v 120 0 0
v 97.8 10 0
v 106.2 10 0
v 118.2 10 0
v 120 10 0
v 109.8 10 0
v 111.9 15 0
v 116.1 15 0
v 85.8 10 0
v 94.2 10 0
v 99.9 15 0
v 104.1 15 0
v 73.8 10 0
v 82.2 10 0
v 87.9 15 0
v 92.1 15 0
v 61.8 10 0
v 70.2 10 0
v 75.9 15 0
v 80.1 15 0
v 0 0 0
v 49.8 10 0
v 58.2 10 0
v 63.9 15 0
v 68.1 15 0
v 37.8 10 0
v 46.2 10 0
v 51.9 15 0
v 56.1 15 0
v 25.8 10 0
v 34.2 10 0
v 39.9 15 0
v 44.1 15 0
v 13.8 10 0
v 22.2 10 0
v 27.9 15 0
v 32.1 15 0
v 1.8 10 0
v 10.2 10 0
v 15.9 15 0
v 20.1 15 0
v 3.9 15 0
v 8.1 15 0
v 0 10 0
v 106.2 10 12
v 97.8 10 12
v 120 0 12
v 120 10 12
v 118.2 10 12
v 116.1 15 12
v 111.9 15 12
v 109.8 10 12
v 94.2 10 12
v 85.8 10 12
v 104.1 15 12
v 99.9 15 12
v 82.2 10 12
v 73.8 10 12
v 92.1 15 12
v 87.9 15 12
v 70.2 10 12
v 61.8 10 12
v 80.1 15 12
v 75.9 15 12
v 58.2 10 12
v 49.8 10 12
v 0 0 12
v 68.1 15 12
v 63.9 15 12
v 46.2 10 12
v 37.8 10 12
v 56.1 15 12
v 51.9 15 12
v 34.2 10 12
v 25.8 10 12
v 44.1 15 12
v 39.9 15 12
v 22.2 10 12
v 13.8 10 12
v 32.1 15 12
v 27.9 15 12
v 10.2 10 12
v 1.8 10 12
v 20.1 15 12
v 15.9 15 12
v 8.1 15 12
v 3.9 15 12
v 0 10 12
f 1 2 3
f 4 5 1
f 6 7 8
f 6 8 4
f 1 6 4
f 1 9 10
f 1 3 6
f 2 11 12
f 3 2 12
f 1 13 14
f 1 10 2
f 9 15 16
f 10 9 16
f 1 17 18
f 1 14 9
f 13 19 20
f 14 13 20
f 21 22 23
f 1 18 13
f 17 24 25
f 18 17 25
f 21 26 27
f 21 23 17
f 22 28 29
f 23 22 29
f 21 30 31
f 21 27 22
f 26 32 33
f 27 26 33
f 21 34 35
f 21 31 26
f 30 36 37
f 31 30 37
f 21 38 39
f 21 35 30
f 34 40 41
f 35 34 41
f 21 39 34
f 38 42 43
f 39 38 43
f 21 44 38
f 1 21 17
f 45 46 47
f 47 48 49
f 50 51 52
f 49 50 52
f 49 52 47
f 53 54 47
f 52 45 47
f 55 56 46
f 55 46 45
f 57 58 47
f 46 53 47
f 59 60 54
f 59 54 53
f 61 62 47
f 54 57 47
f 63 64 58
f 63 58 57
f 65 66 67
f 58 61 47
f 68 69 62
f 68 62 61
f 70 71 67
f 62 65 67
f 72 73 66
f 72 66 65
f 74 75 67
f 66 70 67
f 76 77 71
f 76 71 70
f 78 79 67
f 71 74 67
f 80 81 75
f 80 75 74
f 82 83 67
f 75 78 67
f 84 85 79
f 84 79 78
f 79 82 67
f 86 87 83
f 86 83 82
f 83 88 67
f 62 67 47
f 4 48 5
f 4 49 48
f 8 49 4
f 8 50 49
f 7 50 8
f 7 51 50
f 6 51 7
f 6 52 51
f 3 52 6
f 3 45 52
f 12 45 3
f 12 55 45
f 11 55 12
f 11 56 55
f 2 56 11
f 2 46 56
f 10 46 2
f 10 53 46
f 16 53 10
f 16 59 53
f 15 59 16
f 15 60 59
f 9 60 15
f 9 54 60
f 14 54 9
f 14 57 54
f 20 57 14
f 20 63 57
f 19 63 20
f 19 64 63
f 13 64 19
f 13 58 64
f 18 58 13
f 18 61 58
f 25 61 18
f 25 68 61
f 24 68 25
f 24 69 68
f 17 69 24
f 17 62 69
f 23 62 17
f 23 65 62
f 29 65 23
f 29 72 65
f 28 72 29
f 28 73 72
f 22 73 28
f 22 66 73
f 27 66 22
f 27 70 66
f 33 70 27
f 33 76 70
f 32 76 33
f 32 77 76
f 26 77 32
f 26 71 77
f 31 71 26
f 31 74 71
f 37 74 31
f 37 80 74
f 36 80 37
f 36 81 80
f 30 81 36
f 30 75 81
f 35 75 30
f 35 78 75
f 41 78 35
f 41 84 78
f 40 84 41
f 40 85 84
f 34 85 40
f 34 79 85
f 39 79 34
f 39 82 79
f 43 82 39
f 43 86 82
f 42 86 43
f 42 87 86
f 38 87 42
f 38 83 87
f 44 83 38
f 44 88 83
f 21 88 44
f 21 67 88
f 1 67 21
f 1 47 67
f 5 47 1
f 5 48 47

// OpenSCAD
$fn = 32;

// ----------------------------------------------------------------------
// Gear rack: 10 teeth, pitch 12 mm
// ----------------------------------------------------------------------

// --- parameters (mm) ---
teeth = 10;               // number of teeth
pitch = 12;               // tooth pitch, X
root_w = 8.4;             // tooth width at the root
tip_w = 4.2;              // tooth width at the tip
base_h = 10;              // rack body height, Y
tooth_h = 5;              // tooth height above the body
plate_t = 12;             // rack width, Z (extrusion height)
fit_tol = 0.1;            // declared fit tolerance (prompt contract)
free_tol = 0.5;           // declared free tolerance (prompt contract)

rack_l = teeth * pitch;  // overall length
total_h = base_h + tooth_h;  // overall height

profile = [[0, 0], [120, 0], [120, 10], [118.2, 10], [116.1, 15], [111.9, 15], [109.8, 10], [106.2, 10], [104.1, 15], [99.9, 15], [97.8, 10], [94.2, 10], [92.1, 15], [87.9, 15], [85.8, 10], [82.2, 10], [80.1, 15], [75.9, 15], [73.8, 10], [70.2, 10], [68.1, 15], [63.9, 15], [61.8, 10], [58.2, 10], [56.1, 15], [51.9, 15], [49.8, 10], [46.2, 10], [44.1, 15], [39.9, 15], [37.8, 10], [34.2, 10], [32.1, 15], [27.9, 15], [25.8, 10], [22.2, 10], [20.1, 15], [15.9, 15], [13.8, 10], [10.2, 10], [8.1, 15], [3.9, 15], [1.8, 10], [0, 10]];  // primary outline, 44 points, counter clockwise

// --- the one profile operation ---
linear_extrude(height = plate_t) polygon(points = profile);
